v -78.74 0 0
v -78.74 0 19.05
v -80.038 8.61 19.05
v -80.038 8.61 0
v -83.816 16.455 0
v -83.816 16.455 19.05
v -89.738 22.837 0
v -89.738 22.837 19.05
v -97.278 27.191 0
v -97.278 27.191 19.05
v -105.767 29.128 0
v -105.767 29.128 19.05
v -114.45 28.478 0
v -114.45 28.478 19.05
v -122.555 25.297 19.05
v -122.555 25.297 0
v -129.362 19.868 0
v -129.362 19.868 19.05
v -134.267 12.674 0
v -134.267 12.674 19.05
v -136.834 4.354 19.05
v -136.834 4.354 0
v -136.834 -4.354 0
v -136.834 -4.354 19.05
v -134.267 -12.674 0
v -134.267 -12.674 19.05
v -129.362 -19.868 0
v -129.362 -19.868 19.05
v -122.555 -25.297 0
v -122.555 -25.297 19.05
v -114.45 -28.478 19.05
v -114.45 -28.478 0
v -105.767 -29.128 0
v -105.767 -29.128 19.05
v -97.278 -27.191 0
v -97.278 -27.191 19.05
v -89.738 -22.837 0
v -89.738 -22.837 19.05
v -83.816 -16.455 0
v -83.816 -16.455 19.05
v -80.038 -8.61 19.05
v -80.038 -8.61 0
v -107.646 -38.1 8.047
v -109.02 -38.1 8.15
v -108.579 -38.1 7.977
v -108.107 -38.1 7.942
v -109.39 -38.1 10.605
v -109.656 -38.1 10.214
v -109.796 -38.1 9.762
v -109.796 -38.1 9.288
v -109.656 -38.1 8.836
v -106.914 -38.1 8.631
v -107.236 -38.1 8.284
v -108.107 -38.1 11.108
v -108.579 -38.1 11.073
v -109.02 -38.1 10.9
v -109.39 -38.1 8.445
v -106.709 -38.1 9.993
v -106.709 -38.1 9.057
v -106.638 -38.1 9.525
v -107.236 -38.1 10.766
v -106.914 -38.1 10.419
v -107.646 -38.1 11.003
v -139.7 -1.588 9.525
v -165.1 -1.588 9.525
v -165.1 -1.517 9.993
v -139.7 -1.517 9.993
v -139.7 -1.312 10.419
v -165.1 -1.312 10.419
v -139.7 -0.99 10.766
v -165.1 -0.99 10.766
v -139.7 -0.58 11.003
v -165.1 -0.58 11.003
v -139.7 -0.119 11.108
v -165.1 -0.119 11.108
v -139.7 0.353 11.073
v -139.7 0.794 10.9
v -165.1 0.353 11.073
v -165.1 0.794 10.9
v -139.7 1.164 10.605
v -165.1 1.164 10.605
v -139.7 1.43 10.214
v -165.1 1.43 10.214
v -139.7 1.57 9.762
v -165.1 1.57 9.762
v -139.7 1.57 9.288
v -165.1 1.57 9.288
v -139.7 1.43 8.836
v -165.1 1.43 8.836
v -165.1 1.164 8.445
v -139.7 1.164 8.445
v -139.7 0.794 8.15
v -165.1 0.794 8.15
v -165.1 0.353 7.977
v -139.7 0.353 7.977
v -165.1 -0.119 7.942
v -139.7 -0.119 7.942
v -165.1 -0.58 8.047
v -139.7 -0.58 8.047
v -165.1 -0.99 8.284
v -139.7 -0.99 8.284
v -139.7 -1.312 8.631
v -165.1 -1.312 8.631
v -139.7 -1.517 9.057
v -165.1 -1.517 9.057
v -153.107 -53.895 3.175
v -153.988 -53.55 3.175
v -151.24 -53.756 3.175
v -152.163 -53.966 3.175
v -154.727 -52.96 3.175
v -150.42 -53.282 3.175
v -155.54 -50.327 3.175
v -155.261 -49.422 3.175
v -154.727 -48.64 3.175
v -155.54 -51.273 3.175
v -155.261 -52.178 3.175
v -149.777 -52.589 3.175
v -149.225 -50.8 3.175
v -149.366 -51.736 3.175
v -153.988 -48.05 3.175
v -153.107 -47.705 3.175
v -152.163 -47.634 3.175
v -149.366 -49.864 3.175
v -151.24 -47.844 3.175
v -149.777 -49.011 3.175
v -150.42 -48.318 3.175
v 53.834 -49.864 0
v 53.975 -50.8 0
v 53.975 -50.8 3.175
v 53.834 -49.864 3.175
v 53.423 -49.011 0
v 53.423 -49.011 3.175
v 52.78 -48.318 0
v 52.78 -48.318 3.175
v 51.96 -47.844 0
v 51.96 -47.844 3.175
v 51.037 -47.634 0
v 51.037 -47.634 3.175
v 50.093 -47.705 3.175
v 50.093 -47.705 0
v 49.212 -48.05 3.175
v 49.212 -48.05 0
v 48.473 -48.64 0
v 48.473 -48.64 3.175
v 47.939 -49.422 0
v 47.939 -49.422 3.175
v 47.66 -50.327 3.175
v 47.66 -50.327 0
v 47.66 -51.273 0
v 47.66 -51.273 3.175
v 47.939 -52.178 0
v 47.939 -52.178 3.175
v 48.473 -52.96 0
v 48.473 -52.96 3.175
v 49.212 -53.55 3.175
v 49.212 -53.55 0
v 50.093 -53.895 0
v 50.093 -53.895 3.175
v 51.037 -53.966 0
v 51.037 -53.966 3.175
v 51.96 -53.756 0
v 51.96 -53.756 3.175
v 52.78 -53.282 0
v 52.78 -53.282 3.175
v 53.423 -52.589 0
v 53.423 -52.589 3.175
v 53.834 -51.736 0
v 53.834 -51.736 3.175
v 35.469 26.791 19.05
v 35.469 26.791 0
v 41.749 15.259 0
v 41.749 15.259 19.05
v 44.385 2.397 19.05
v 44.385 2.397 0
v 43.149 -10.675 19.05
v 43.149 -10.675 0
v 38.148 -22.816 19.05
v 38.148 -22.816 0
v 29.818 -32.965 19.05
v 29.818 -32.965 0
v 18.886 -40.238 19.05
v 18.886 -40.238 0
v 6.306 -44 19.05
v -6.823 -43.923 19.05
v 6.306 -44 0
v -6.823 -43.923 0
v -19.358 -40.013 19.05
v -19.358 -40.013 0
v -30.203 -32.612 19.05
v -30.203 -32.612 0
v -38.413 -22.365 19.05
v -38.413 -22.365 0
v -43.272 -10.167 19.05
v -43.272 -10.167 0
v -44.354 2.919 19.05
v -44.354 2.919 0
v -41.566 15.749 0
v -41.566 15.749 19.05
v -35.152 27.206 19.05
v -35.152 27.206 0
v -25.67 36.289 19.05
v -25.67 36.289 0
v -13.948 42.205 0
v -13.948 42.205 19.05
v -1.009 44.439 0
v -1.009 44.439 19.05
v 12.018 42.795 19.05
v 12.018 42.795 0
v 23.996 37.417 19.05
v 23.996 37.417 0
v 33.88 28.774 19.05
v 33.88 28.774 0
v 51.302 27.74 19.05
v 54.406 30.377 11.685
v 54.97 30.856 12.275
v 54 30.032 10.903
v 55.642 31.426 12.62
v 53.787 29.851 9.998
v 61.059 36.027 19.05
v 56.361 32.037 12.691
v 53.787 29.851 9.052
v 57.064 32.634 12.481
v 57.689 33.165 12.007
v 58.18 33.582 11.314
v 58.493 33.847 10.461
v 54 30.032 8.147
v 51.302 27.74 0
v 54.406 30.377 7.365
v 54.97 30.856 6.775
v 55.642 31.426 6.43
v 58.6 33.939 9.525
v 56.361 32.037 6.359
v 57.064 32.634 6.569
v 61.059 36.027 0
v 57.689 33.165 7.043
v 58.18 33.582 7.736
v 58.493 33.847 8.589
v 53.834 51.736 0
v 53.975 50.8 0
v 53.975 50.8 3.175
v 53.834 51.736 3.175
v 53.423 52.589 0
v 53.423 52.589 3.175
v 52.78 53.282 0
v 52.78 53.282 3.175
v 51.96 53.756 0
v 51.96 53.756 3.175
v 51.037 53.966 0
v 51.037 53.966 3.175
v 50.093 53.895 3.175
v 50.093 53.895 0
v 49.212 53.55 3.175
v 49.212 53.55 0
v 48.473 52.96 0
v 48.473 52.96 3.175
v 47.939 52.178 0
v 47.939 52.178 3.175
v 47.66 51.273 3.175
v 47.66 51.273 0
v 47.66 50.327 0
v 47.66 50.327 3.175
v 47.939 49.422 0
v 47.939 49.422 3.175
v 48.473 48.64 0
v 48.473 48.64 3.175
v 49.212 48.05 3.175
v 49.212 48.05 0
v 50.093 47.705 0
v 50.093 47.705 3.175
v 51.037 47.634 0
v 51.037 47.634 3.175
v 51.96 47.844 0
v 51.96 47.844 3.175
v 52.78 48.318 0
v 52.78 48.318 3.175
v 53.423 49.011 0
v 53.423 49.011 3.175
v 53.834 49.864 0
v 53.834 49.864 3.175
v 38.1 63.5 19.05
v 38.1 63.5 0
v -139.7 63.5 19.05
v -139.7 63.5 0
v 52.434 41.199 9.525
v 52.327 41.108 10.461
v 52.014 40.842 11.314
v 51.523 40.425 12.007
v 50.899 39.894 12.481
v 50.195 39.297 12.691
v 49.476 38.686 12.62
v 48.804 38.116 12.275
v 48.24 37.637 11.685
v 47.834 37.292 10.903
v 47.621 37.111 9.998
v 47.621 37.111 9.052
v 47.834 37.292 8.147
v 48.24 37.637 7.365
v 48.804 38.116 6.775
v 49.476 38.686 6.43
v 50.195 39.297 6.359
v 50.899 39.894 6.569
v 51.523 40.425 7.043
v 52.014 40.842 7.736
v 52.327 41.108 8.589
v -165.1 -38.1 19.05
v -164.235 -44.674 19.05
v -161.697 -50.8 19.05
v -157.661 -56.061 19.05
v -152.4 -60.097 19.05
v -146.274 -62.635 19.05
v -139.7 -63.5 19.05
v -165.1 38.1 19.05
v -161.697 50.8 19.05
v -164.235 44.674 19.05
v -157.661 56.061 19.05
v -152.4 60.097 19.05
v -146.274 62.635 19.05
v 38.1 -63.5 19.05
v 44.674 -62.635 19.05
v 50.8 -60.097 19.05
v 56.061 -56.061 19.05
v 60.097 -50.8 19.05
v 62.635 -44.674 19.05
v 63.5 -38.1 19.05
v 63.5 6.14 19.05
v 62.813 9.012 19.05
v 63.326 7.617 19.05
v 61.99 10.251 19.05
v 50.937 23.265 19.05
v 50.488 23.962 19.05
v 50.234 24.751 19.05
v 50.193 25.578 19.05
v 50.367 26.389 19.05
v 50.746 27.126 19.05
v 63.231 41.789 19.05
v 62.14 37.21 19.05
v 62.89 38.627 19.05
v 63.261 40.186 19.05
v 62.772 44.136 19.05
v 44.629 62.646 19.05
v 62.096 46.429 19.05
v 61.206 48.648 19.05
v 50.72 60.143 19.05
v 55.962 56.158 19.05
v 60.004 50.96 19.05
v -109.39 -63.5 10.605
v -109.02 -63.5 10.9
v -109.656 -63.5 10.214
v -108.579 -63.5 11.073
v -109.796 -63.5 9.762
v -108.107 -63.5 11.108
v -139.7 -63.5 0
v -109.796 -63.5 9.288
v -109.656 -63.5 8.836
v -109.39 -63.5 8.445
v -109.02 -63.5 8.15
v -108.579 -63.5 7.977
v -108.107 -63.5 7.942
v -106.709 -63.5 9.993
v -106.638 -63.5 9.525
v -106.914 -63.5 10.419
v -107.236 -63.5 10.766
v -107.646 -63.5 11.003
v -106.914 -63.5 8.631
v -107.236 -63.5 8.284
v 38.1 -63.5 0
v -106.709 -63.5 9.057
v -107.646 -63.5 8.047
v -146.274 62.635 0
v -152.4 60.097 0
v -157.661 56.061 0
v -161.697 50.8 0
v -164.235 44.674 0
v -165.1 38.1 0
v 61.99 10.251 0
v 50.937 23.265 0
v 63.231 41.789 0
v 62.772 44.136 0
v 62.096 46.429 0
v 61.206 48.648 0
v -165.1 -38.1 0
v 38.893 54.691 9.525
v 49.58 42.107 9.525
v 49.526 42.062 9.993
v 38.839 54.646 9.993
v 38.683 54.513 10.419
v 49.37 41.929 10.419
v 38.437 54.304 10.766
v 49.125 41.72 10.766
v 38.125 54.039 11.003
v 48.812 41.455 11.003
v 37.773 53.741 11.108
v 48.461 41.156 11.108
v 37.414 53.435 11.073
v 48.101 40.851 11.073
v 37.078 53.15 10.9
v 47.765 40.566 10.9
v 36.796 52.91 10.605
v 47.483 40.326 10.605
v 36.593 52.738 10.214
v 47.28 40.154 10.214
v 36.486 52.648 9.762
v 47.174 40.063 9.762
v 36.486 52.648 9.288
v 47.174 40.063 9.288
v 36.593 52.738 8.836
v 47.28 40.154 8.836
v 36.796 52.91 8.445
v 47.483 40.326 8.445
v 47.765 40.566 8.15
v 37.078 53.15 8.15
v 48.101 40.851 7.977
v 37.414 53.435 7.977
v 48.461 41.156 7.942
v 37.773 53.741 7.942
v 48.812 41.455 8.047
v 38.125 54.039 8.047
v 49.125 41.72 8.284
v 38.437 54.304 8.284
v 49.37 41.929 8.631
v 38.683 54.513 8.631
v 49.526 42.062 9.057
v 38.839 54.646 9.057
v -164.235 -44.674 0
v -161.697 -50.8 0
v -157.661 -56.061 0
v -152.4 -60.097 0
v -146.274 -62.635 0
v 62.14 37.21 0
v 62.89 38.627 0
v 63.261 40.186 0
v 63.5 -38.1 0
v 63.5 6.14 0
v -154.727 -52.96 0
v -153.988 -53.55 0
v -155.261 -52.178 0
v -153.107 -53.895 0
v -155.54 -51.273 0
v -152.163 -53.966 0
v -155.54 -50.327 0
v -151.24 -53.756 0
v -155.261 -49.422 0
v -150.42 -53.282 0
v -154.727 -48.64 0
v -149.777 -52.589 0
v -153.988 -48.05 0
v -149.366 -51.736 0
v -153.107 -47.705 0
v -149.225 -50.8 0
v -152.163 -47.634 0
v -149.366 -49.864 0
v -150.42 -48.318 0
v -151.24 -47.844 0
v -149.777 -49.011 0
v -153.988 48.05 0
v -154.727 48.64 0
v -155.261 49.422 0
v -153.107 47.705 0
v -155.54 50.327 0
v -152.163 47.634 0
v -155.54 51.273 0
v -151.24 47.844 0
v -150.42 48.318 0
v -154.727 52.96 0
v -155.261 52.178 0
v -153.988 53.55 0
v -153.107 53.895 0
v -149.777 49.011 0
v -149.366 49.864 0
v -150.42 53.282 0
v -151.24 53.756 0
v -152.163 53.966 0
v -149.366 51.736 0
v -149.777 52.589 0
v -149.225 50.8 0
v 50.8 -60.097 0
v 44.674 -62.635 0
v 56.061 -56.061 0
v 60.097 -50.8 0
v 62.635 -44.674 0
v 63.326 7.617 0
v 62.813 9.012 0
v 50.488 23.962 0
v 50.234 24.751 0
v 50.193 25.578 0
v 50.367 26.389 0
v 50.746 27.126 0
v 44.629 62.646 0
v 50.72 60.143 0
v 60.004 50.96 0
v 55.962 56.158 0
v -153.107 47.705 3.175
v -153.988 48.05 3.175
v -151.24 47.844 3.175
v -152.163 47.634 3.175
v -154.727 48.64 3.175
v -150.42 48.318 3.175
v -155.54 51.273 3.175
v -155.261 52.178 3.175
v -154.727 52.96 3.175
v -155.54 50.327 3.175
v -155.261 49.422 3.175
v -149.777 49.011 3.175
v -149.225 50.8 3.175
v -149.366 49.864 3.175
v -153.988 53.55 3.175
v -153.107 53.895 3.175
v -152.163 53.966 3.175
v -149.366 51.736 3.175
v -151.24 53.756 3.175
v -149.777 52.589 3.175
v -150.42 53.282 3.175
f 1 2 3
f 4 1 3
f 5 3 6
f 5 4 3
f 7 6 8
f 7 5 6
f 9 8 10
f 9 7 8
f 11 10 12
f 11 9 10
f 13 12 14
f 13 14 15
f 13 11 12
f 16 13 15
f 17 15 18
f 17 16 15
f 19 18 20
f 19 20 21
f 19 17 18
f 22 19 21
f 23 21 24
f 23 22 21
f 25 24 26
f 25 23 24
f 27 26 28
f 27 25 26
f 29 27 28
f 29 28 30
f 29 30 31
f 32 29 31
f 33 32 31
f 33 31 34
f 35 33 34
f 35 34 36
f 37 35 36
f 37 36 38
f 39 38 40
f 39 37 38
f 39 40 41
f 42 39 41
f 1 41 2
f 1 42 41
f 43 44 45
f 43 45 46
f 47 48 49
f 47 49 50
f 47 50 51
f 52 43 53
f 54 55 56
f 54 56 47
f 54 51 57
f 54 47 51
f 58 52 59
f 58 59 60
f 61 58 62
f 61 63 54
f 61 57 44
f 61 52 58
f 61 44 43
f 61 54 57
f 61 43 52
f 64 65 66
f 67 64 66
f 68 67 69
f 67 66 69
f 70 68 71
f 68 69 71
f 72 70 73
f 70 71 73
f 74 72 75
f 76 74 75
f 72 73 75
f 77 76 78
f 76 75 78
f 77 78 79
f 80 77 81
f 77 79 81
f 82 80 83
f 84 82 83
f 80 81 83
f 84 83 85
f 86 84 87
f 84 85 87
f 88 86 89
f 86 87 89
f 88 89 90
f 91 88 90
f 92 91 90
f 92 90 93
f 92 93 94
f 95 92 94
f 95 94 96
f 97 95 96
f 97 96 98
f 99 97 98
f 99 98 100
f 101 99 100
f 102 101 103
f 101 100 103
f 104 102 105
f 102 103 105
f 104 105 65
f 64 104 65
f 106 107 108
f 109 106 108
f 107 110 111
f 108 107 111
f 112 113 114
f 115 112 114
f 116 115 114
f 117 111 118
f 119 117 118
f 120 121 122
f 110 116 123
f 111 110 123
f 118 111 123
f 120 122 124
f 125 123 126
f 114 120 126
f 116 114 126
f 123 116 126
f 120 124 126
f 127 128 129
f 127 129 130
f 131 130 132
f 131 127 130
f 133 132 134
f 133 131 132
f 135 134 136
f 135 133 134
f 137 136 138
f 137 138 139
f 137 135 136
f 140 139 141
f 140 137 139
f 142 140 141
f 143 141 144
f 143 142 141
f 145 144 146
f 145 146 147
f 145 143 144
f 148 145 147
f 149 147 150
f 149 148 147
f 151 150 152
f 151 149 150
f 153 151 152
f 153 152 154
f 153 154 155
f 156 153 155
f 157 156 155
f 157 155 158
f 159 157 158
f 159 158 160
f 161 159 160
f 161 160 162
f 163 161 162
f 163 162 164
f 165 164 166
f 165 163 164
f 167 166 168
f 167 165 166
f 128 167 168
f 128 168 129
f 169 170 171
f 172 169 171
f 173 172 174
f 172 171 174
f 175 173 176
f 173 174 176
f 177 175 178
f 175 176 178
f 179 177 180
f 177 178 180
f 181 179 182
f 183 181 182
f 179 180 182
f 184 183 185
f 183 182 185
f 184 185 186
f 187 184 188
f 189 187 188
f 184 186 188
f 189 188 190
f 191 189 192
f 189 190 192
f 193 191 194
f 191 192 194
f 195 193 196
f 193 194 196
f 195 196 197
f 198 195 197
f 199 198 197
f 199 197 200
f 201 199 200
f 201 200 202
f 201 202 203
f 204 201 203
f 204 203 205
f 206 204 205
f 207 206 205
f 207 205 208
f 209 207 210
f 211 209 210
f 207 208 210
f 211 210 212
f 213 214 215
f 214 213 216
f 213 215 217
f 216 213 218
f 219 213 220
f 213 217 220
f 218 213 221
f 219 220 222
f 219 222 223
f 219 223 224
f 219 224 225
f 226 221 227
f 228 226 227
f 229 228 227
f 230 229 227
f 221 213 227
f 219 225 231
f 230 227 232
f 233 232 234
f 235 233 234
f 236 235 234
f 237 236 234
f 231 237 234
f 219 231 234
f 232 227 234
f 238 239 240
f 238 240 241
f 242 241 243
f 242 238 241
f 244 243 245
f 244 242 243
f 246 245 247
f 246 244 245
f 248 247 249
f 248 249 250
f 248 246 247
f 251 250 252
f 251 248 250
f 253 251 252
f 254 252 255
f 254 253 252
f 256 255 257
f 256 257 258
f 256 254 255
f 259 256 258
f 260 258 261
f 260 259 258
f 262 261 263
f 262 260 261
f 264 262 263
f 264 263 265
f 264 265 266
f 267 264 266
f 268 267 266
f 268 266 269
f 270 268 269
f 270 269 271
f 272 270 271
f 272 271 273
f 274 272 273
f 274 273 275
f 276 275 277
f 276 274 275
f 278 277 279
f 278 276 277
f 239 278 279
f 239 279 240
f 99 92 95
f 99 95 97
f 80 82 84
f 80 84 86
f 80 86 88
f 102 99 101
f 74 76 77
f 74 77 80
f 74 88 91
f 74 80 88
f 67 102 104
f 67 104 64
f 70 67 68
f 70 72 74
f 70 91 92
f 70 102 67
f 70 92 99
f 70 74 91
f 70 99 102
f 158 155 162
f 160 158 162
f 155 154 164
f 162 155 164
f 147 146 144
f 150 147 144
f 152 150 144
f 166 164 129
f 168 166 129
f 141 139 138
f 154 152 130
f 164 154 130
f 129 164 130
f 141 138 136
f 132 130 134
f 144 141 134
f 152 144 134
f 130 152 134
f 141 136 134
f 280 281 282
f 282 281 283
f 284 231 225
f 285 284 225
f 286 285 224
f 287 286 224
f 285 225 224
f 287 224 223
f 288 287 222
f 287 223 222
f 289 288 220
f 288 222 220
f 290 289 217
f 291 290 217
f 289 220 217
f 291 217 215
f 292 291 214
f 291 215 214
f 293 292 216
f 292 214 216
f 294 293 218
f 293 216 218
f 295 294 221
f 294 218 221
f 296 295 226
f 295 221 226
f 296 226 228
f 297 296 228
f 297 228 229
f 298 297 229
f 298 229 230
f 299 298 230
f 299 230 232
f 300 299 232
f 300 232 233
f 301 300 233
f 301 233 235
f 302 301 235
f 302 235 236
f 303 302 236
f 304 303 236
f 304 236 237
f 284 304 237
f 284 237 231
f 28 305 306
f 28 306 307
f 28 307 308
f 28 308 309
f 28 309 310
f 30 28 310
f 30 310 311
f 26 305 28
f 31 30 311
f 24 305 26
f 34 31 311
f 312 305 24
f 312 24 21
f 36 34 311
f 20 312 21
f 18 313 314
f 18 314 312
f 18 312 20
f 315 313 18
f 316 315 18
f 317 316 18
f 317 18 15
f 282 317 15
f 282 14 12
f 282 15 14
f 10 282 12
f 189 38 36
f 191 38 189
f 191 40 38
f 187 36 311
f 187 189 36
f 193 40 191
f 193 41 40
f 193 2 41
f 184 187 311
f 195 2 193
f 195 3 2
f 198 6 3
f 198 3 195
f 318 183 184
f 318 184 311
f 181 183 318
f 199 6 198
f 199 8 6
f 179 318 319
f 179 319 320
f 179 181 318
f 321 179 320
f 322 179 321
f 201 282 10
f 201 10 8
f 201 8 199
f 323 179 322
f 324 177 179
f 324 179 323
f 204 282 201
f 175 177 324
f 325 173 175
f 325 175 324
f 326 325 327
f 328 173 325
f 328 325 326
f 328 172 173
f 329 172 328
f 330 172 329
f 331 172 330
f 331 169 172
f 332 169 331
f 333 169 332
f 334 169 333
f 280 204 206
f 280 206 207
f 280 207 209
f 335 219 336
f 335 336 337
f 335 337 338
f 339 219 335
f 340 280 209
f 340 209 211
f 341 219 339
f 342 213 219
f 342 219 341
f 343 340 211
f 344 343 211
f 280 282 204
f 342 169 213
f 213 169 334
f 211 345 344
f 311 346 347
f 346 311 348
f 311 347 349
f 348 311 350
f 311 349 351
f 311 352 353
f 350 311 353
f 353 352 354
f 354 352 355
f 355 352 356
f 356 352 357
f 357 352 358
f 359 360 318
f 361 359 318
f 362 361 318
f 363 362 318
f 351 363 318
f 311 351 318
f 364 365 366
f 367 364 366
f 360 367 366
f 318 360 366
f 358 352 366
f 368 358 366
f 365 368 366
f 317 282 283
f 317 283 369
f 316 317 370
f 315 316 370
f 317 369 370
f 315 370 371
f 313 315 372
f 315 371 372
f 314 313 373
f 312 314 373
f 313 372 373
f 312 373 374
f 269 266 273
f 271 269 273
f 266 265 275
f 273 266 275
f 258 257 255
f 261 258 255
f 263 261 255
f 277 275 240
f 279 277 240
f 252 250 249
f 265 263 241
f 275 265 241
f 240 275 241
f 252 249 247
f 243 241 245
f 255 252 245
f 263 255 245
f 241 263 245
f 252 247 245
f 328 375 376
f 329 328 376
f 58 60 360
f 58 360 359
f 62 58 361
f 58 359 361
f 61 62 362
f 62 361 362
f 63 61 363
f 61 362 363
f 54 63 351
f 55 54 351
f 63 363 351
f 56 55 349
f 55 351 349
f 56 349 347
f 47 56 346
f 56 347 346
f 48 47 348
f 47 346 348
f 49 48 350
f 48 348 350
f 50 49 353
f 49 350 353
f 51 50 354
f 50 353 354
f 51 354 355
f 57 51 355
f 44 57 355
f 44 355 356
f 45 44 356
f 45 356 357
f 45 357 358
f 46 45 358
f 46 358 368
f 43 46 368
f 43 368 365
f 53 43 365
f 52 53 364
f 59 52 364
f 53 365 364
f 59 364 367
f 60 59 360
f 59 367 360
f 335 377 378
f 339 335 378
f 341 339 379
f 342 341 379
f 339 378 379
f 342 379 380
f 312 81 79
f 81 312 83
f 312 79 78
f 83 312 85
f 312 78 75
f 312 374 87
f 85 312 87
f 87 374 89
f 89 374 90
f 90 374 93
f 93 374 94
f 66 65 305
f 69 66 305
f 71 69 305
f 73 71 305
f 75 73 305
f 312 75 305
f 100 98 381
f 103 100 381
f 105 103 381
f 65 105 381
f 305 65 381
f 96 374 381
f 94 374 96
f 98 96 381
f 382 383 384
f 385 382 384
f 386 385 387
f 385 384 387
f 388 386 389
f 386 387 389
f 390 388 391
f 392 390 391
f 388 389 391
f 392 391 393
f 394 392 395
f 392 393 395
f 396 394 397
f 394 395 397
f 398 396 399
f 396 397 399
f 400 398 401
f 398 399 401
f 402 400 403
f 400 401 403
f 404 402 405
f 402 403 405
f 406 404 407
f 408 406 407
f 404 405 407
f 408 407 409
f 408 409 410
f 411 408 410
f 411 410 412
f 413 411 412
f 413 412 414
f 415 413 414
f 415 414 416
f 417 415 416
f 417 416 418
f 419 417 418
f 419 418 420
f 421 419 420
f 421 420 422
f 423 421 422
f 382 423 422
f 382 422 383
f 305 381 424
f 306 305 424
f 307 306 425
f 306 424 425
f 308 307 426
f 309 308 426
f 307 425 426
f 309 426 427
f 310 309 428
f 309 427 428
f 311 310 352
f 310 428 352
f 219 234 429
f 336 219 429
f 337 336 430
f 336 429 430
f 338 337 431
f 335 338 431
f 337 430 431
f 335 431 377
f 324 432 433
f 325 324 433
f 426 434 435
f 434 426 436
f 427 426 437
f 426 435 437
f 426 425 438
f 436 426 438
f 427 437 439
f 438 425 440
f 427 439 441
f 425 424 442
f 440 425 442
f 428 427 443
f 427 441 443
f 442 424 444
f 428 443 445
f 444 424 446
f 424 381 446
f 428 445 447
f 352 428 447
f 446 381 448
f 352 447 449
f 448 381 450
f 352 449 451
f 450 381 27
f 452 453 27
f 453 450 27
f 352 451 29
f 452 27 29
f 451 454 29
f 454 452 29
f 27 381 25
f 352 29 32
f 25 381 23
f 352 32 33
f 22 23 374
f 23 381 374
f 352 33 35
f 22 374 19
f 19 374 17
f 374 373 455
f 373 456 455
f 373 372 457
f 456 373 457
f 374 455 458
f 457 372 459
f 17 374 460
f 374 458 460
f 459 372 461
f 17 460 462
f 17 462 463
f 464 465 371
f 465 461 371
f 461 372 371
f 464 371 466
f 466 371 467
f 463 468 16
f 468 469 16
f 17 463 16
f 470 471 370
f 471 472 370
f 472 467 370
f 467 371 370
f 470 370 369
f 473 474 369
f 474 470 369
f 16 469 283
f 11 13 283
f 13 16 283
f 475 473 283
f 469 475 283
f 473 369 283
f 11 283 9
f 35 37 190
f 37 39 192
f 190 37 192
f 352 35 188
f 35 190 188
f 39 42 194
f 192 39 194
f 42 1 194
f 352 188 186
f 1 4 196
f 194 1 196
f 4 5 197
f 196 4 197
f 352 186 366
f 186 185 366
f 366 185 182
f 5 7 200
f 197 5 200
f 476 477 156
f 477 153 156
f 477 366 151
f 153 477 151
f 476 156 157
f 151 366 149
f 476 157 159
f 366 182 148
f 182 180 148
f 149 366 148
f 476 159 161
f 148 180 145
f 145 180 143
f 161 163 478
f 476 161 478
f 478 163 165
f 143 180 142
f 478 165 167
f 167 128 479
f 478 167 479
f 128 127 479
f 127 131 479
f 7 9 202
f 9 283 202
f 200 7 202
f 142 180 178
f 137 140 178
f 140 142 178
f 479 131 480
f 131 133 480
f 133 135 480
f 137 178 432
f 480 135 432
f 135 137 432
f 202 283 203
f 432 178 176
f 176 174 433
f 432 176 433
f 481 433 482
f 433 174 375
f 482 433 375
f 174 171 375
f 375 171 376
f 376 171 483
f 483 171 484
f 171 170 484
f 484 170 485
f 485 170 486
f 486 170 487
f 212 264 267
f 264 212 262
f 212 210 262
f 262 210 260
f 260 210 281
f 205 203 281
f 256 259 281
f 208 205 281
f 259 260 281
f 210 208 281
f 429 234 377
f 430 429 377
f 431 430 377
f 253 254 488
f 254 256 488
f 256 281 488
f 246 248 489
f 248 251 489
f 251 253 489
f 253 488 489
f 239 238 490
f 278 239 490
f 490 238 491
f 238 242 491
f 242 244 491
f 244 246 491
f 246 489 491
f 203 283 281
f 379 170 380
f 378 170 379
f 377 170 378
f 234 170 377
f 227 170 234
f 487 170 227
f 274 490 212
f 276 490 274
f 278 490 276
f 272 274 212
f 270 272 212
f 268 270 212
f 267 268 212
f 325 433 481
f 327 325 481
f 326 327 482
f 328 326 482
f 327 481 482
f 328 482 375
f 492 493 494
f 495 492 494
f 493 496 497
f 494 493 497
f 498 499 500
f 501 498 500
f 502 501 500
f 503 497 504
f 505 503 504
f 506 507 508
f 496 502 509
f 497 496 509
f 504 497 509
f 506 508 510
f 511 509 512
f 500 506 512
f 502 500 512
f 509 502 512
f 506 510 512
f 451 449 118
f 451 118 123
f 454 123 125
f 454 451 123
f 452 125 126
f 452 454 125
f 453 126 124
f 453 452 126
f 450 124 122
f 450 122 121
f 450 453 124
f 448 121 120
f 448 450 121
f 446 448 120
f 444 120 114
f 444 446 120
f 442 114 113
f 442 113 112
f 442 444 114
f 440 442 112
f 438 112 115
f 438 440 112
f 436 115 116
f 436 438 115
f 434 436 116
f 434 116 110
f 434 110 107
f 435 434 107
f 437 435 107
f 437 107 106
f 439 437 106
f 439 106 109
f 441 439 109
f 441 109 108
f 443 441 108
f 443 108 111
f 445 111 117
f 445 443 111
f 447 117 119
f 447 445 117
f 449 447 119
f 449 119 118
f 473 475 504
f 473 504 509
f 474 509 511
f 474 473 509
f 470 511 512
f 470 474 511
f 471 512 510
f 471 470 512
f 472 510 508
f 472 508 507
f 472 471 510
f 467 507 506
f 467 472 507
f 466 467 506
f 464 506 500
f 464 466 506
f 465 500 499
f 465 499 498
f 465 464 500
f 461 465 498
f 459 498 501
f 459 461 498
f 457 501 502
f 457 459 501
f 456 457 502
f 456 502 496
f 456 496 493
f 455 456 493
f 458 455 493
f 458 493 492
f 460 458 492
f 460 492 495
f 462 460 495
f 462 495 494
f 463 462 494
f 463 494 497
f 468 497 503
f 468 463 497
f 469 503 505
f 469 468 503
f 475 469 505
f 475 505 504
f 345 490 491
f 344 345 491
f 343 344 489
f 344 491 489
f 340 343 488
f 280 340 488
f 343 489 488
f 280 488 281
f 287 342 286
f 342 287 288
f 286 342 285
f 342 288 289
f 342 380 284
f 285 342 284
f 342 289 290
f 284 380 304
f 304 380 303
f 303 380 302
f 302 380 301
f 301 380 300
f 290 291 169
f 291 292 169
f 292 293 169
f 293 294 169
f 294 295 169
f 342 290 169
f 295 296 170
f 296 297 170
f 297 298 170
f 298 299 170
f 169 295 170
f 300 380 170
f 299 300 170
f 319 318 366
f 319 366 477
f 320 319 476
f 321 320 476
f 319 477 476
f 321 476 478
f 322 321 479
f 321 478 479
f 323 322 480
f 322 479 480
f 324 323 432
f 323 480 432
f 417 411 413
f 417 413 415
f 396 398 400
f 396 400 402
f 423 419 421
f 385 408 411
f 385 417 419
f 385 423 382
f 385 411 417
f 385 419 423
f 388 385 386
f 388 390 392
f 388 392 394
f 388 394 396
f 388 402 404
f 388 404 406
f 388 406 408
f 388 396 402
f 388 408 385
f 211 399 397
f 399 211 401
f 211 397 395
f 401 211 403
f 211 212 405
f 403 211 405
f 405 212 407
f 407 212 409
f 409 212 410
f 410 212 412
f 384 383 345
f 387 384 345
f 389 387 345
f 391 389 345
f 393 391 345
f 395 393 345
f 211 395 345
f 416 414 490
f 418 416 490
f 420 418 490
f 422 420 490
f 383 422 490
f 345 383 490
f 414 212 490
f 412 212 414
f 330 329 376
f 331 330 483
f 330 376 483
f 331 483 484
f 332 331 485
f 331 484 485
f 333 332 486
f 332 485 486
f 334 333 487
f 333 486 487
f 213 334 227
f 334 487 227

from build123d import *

# Parameters (mm, degrees)
F0_R      = 29.21
F10_DEPTH = 19.05
F1_R      = 3.175
F2_DEPTH  = 3.175
F3_R      = 1.5875
F4_DEPTH  = 28.575
F5_R      = 3.175
F11_DEPTH = 9.526
F6_R      = 1.5875
F7_DEPTH  = 25.4
F8_R      = 1.5875
F9_DEPTH  = 25.4


with BuildPart() as f10:
    # F0 (on Top) → F10 (new body)
    with BuildSketch(Plane.XY):
        with BuildLine():
            Line((38.1, 63.5), (-139.7, 63.5))
            ThreePointArc((-139.7, 63.5), (-157.6605122421, 56.0605122421), (-165.1, 38.1))
            Line((-165.1, 38.1), (-165.1, -38.1))
            ThreePointArc((-165.1, -38.1), (-157.6605122421, -56.0605122421), (-139.7, -63.5))
            Line((-139.7, -63.5), (38.1, -63.5))
            ThreePointArc((38.1, -63.5), (56.0605122421, -56.0605122421), (63.5, -38.1))
            Line((63.5, -38.1), (63.5, 6.1400658214))
            ThreePointArc((63.5, 6.1400658214), (63.1105704313, 8.3296091832), (61.9900472022, 10.2505941427))
            Line((61.9900472022, 10.2505941427), (50.937113555, 23.2651548983))
            ThreePointArc((50.937113555, 23.2651548983), (50.192630832, 25.5783429328), (51.3018729955, 27.7404426601))
            Line((51.3018729955, 27.7404426601), (61.058563678, 36.026550563))
            ThreePointArc((61.058563678, 36.026550563), (62.8898833704, 38.6267446044), (63.2307138089, 41.7887970203))
            ThreePointArc((63.2307138089, 41.7887970203), (62.4610549959, 45.2902016304), (61.206100491, 48.648370495))
            Line((61.206100491, 48.648370495), (35.46918169, 26.7906634902))
            ThreePointArc((35.46918169, 26.7906634902), (-34.6889292719, -27.7935367661), (33.8803304154, 28.7736982493))
            Line((33.8803304154, 28.7736982493), (60.0039803909, 50.9598461512))
            ThreePointArc((60.0039803909, 50.9598461512), (50.719823845, 60.1431405685), (38.1, 63.5))
        make_face()
        with Locations((-107.95, 0)):
            Circle(F0_R, mode=Mode.SUBTRACT)
    extrude(amount=F10_DEPTH)

    # F1 (on face) → F2 (cut)
    with BuildSketch(Plane.XY):
        with Locations((-152.4, -50.8)):
            Circle(F1_R)
        with Locations((50.8, -50.8)):
            Circle(F1_R)
        with Locations((50.8, 50.8)):
            Circle(F1_R)
        with Locations((-152.4, 50.8)):
            Circle(F1_R)
    extrude(amount=F2_DEPTH, mode=Mode.SUBTRACT)

    # F3 (on face) → F4 (cut)
    with BuildSketch(Plane(origin=(7.8100038105, -9.1960896842, 0), x_dir=(0.7622121578, 0.6473272947, 0), z_dir=(0.6473272947, -0.7622121578, 0))):
        with Locations((63.4603030527, 9.525)):
            Circle(F3_R)
    extrude(amount=-F4_DEPTH, mode=Mode.SUBTRACT)

    # F5 (on face) → F11 (cut, through all)
    with BuildSketch(Plane(origin=(7.8100038105, -9.1960896842, 0), x_dir=(0.7622121578, 0.6473272947, 0), z_dir=(0.6473272947, -0.7622121578, 0))):
        with Locations((63.4603030527, 9.525)):
            Circle(F5_R)
    extrude(amount=-F11_DEPTH, mode=Mode.SUBTRACT)

    # F6 (on face) → F7 (cut)
    with BuildSketch(Plane.XZ.offset(63.5)):
        with Locations((-108.2258597016, 9.525)):
            Circle(F6_R)
    extrude(amount=-F7_DEPTH, mode=Mode.SUBTRACT)

    # F8 (on face) → F9 (cut)
    with BuildSketch(Plane(origin=(-165.1, 0, 0), x_dir=(0, -1, 0), z_dir=(-1, 0, 0))):
        with Locations((0, 9.525)):
            Circle(F8_R)
    extrude(amount=-F9_DEPTH, mode=Mode.SUBTRACT)


solid = f10.part
